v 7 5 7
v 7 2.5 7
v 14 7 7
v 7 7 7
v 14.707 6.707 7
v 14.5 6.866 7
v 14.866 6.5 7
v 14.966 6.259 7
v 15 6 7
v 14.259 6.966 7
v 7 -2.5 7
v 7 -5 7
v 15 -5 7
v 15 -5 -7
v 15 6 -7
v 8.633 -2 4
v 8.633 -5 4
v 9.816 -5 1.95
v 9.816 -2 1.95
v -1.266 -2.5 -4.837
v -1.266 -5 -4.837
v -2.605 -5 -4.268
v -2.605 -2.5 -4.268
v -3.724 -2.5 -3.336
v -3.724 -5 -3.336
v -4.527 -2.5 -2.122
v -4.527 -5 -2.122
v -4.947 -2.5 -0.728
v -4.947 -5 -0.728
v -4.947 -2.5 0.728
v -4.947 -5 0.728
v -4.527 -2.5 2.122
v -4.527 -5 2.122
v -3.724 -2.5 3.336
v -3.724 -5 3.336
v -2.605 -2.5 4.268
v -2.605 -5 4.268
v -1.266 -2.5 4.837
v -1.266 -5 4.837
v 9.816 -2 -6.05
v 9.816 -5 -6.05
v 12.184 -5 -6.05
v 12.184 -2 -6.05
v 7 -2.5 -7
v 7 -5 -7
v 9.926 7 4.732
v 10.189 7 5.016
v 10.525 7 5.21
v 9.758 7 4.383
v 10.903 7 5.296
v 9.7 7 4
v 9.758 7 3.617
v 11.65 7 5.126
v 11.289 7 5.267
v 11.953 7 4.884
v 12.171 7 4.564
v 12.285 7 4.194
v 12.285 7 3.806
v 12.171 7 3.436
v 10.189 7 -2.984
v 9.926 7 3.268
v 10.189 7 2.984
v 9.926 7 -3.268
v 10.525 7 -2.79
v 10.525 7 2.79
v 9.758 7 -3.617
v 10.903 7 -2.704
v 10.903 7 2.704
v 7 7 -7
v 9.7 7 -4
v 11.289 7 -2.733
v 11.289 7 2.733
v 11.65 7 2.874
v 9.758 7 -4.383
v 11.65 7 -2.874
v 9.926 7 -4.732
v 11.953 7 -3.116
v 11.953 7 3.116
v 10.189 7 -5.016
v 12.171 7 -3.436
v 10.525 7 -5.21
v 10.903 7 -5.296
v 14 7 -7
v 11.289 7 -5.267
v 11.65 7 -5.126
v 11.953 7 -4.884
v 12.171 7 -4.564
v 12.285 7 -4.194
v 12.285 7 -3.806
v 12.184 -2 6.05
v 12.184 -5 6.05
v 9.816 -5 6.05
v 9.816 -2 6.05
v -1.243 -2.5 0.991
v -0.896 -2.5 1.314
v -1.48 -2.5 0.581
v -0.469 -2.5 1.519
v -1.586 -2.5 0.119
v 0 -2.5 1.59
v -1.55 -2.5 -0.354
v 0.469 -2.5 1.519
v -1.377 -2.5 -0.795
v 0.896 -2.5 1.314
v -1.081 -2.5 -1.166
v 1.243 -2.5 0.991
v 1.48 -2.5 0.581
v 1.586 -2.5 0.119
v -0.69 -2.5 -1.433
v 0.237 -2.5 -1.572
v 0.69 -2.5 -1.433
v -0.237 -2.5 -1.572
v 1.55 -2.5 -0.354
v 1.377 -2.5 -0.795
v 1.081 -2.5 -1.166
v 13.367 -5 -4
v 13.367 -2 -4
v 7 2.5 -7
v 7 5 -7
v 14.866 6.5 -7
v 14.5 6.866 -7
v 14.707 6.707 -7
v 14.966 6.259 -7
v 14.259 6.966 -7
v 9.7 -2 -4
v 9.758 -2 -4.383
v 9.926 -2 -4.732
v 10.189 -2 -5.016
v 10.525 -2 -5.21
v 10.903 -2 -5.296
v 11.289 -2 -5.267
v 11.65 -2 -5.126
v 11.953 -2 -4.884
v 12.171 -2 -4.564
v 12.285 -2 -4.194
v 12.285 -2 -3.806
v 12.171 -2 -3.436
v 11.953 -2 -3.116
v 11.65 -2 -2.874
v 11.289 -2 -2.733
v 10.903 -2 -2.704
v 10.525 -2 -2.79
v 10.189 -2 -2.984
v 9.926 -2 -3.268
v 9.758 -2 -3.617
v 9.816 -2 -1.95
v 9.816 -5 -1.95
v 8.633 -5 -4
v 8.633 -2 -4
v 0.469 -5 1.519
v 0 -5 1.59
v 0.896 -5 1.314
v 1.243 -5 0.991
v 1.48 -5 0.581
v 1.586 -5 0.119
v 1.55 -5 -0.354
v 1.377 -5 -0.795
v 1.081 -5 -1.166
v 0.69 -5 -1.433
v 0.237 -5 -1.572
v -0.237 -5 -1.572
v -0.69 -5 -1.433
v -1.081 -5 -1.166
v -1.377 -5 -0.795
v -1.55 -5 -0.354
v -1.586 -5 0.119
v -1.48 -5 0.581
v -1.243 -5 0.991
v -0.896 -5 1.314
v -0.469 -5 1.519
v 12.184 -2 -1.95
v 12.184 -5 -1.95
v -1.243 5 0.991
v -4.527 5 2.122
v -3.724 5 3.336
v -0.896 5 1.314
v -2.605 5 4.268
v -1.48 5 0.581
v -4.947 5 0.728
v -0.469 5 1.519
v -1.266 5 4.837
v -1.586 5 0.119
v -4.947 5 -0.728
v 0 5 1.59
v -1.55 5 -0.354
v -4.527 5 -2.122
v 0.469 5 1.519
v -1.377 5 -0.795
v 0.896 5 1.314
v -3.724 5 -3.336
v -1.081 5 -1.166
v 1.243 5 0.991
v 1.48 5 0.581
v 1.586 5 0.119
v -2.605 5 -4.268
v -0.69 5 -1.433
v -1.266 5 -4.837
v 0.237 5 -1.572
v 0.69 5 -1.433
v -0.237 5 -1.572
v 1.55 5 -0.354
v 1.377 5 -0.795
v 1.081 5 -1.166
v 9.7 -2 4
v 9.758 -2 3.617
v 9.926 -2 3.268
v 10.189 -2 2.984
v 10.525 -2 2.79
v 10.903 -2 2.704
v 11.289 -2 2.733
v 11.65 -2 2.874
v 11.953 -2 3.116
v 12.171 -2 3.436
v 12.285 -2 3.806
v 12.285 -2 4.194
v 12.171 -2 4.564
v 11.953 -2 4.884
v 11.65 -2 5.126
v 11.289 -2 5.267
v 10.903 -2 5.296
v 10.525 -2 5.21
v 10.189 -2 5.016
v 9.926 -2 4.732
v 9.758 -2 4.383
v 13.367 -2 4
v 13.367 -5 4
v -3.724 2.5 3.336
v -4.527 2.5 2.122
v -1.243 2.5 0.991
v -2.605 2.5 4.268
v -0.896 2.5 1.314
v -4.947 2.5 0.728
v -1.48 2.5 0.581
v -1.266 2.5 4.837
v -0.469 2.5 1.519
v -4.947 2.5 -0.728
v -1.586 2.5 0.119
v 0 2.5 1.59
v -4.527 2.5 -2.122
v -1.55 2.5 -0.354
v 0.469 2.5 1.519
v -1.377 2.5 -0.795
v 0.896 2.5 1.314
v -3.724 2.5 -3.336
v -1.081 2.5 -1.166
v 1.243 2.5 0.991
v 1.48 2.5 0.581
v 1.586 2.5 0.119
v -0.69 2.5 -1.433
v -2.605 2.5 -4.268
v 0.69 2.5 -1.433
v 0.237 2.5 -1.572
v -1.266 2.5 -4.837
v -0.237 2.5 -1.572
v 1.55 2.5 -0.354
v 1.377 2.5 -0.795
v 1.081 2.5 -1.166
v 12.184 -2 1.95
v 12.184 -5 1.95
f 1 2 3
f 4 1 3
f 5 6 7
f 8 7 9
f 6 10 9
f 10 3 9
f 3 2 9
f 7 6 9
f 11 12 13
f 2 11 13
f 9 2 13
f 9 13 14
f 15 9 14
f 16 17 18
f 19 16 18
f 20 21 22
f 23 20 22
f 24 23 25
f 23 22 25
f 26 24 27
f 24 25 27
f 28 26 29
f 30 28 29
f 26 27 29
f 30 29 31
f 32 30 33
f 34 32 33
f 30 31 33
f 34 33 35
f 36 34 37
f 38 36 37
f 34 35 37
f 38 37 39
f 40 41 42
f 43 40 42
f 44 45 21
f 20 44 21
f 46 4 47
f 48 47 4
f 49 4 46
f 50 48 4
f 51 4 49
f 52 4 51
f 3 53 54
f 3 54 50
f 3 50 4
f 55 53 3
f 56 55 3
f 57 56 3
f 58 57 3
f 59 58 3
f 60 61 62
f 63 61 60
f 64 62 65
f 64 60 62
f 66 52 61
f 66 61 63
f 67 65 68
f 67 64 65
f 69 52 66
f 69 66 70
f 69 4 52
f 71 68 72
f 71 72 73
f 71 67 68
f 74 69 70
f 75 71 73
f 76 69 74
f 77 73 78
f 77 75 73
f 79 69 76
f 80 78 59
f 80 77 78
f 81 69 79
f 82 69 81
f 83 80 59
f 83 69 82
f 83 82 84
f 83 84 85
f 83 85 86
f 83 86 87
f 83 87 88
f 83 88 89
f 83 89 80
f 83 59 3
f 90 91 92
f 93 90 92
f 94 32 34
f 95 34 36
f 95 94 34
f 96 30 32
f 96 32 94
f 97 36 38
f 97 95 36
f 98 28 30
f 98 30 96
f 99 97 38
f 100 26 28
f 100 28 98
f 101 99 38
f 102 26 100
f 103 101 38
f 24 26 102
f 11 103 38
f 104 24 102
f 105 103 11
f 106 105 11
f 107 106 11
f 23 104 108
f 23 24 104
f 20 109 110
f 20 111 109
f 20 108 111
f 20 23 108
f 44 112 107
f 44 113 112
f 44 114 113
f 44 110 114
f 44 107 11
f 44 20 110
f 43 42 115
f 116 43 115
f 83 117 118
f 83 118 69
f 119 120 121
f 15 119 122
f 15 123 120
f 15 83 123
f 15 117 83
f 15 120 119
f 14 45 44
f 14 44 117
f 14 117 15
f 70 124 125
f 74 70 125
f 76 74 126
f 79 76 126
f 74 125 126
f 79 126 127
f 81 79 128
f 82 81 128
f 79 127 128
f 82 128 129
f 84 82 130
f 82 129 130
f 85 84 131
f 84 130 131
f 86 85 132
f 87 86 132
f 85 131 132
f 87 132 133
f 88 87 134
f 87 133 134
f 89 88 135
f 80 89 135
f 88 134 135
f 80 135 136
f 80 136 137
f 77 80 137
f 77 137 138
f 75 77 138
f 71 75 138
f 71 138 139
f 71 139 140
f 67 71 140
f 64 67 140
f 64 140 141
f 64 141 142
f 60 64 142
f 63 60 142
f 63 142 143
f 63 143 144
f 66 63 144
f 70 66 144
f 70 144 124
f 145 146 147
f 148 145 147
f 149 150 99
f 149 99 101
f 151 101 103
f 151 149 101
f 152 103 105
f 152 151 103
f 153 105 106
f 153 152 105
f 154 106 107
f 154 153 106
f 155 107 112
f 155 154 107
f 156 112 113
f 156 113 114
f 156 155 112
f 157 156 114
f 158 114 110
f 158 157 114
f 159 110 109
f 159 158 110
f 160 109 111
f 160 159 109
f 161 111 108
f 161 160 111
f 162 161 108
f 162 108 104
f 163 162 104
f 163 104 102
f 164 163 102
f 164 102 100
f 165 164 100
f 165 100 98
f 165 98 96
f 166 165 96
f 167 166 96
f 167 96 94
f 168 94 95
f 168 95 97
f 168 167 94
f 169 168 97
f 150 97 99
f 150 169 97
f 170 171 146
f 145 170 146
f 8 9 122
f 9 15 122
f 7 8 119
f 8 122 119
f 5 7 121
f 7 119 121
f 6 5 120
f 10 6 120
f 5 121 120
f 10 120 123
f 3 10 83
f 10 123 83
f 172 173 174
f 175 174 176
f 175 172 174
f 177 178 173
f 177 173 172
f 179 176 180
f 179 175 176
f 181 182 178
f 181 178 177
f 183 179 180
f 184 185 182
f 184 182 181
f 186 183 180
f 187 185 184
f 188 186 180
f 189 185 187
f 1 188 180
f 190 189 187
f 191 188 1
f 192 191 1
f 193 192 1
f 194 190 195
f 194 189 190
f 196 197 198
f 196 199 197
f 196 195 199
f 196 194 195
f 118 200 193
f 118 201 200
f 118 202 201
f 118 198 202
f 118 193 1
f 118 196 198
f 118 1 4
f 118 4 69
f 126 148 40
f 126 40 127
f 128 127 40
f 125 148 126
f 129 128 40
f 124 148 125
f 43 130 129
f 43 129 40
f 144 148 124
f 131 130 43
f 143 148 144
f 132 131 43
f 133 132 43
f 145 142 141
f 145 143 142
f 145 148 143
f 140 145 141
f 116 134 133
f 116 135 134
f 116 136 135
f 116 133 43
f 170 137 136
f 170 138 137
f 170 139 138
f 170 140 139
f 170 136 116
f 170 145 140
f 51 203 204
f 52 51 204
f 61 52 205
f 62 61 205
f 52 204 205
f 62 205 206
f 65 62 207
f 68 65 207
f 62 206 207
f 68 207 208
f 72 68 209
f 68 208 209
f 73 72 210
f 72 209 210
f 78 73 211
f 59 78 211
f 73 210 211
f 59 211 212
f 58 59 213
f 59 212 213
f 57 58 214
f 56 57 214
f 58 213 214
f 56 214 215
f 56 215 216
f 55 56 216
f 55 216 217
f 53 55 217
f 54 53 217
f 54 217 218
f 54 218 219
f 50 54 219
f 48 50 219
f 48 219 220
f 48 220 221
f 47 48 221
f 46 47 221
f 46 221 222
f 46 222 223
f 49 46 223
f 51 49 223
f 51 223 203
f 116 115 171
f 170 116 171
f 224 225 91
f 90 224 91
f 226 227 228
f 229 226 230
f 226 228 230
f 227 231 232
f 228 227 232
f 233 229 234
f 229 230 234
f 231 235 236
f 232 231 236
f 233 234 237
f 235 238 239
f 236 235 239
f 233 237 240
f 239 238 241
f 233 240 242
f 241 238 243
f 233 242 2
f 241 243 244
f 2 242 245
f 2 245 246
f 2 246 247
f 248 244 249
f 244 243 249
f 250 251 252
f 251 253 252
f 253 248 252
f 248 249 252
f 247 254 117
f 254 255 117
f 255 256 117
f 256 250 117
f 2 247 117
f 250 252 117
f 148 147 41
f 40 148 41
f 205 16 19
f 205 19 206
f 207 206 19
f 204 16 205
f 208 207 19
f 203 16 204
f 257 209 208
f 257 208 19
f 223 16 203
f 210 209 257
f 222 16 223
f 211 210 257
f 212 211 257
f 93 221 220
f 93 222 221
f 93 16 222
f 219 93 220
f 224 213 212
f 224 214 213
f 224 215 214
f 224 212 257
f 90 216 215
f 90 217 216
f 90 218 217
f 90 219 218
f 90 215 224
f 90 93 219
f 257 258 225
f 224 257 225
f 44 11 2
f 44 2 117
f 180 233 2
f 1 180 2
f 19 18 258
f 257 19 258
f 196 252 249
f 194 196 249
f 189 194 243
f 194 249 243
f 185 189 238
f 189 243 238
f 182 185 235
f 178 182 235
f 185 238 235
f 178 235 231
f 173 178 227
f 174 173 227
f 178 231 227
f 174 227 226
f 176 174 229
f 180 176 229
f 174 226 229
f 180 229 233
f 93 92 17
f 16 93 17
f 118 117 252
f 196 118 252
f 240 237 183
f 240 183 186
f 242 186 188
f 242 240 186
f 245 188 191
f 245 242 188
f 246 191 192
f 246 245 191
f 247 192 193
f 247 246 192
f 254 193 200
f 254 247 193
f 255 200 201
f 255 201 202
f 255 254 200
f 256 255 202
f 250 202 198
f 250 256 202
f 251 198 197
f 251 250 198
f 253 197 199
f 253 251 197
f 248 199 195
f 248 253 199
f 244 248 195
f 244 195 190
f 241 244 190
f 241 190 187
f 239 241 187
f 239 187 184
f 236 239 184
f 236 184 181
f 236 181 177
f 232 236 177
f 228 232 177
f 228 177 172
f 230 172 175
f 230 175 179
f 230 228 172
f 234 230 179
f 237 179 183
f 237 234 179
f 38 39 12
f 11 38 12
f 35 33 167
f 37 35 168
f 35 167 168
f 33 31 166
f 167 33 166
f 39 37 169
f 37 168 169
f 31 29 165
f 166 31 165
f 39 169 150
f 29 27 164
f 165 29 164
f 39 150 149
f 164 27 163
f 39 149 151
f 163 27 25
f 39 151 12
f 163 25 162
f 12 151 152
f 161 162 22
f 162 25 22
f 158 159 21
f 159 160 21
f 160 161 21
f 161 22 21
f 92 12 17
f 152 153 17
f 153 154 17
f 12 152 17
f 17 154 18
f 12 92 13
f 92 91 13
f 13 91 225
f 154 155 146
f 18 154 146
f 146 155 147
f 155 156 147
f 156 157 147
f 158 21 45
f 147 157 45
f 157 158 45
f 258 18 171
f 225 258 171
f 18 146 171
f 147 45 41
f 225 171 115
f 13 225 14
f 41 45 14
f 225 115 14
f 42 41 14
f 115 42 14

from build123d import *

# Parameters (mm, degrees)
BOSS_EXTRUDE1_DEPTH      = 7
BOSS_EXTRUDE1_DEPTH_BACK = 5
SKETCH1_W                = 8
SKETCH1_H                = 14
BOSS_EXTRUDE2_START      = 2.5
SKETCH1_3_R              = 1.59
BOSS_EXTRUDE2_DEPTH      = 2.5
BOSS_EXTRUDE3_START      = -5
SKETCH1_4_R              = 1.59
BOSS_EXTRUDE3_DEPTH      = 2.5
M2_CLEARANCE_HOLE1_D     = 2.6
CUT_EXTRUDE1_DEPTH       = 3
FILLET2_R                = 1


with BuildPart() as part:
    # Sketch1 → Boss-Extrude1 (new, two sides: drawn at the far end of the back side and taken through both)
    with BuildSketch(Plane(origin=(0, 0, 0), x_dir=(1, 0, 0), z_dir=(0, 1, 0)).offset(-BOSS_EXTRUDE1_DEPTH_BACK)):
        with Locations((11, 0)):
            Rectangle(SKETCH1_W, SKETCH1_H)
    extrude(amount=BOSS_EXTRUDE1_DEPTH + BOSS_EXTRUDE1_DEPTH_BACK)

    # Sketch1<3> → Boss-Extrude2 (add)
    with BuildSketch(Plane(origin=(0, 0, 0), x_dir=(1, 0, 0), z_dir=(0, 1, 0)).offset(BOSS_EXTRUDE2_START)):
        with BuildLine():
            Line((7, 7), (-1.265715623, 4.837144195))
            ThreePointArc((-1.265715623, 4.837144195), (-5, 0), (-1.265715623, -4.837144195))
            Line((-1.265715623, -4.837144195), (7, -7))
            Line((7, -7), (7, 7))
        make_face()
        with Locations(Location((0, 0, 0), (0, 0, 270))):
            Circle(SKETCH1_3_R, mode=Mode.SUBTRACT)
    extrude(amount=BOSS_EXTRUDE2_DEPTH)

    # Sketch1<4> → Boss-Extrude3 (add)
    with BuildSketch(Plane(origin=(0, 0, 0), x_dir=(1, 0, 0), z_dir=(0, 1, 0)).offset(BOSS_EXTRUDE3_START)):
        with BuildLine():
            Line((7, 7), (-1.265715623, 4.837144195))
            ThreePointArc((-1.265715623, 4.837144195), (-5, 0), (-1.265715623, -4.837144195))
            Line((-1.265715623, -4.837144195), (7, -7))
            Line((7, -7), (7, 7))
        make_face()
        with Locations(Location((0, 0, 0), (0, 0, 270))):
            Circle(SKETCH1_4_R, mode=Mode.SUBTRACT)
    extrude(amount=BOSS_EXTRUDE3_DEPTH)

    # M2 Clearance Hole1 (through all)
    with Locations(Plane(origin=(0, 7, 0), x_dir=(1, 0, 0), z_dir=(0, 1, 0))):
        with Locations((11, 4), (11, -4)):
            Hole(M2_CLEARANCE_HOLE1_D / 2)

    # Sketch4 → Cut-Extrude1 (cut)
    with BuildSketch(Plane.XZ.offset(5)):
        Polygon((9.816431948, 1.95), (12.183568052, 1.95), (13.367136104, 4), (12.183568052, 6.05), (9.816431948, 6.05), (8.632863896, 4), align=None)
        Polygon((8.632863896, -4), (9.816431948, -6.05), (12.183568052, -6.05), (13.367136104, -4), (12.183568052, -1.95), (9.816431948, -1.95), align=None)
    extrude(amount=-CUT_EXTRUDE1_DEPTH, mode=Mode.SUBTRACT)

    # Fillet2
    fillet2_edges = [part.edges().sort_by_distance(p)[0] for p in [
        (15, 7, 0),
    ]]
    fillet(fillet2_edges, radius=FILLET2_R)


solid = part.part
